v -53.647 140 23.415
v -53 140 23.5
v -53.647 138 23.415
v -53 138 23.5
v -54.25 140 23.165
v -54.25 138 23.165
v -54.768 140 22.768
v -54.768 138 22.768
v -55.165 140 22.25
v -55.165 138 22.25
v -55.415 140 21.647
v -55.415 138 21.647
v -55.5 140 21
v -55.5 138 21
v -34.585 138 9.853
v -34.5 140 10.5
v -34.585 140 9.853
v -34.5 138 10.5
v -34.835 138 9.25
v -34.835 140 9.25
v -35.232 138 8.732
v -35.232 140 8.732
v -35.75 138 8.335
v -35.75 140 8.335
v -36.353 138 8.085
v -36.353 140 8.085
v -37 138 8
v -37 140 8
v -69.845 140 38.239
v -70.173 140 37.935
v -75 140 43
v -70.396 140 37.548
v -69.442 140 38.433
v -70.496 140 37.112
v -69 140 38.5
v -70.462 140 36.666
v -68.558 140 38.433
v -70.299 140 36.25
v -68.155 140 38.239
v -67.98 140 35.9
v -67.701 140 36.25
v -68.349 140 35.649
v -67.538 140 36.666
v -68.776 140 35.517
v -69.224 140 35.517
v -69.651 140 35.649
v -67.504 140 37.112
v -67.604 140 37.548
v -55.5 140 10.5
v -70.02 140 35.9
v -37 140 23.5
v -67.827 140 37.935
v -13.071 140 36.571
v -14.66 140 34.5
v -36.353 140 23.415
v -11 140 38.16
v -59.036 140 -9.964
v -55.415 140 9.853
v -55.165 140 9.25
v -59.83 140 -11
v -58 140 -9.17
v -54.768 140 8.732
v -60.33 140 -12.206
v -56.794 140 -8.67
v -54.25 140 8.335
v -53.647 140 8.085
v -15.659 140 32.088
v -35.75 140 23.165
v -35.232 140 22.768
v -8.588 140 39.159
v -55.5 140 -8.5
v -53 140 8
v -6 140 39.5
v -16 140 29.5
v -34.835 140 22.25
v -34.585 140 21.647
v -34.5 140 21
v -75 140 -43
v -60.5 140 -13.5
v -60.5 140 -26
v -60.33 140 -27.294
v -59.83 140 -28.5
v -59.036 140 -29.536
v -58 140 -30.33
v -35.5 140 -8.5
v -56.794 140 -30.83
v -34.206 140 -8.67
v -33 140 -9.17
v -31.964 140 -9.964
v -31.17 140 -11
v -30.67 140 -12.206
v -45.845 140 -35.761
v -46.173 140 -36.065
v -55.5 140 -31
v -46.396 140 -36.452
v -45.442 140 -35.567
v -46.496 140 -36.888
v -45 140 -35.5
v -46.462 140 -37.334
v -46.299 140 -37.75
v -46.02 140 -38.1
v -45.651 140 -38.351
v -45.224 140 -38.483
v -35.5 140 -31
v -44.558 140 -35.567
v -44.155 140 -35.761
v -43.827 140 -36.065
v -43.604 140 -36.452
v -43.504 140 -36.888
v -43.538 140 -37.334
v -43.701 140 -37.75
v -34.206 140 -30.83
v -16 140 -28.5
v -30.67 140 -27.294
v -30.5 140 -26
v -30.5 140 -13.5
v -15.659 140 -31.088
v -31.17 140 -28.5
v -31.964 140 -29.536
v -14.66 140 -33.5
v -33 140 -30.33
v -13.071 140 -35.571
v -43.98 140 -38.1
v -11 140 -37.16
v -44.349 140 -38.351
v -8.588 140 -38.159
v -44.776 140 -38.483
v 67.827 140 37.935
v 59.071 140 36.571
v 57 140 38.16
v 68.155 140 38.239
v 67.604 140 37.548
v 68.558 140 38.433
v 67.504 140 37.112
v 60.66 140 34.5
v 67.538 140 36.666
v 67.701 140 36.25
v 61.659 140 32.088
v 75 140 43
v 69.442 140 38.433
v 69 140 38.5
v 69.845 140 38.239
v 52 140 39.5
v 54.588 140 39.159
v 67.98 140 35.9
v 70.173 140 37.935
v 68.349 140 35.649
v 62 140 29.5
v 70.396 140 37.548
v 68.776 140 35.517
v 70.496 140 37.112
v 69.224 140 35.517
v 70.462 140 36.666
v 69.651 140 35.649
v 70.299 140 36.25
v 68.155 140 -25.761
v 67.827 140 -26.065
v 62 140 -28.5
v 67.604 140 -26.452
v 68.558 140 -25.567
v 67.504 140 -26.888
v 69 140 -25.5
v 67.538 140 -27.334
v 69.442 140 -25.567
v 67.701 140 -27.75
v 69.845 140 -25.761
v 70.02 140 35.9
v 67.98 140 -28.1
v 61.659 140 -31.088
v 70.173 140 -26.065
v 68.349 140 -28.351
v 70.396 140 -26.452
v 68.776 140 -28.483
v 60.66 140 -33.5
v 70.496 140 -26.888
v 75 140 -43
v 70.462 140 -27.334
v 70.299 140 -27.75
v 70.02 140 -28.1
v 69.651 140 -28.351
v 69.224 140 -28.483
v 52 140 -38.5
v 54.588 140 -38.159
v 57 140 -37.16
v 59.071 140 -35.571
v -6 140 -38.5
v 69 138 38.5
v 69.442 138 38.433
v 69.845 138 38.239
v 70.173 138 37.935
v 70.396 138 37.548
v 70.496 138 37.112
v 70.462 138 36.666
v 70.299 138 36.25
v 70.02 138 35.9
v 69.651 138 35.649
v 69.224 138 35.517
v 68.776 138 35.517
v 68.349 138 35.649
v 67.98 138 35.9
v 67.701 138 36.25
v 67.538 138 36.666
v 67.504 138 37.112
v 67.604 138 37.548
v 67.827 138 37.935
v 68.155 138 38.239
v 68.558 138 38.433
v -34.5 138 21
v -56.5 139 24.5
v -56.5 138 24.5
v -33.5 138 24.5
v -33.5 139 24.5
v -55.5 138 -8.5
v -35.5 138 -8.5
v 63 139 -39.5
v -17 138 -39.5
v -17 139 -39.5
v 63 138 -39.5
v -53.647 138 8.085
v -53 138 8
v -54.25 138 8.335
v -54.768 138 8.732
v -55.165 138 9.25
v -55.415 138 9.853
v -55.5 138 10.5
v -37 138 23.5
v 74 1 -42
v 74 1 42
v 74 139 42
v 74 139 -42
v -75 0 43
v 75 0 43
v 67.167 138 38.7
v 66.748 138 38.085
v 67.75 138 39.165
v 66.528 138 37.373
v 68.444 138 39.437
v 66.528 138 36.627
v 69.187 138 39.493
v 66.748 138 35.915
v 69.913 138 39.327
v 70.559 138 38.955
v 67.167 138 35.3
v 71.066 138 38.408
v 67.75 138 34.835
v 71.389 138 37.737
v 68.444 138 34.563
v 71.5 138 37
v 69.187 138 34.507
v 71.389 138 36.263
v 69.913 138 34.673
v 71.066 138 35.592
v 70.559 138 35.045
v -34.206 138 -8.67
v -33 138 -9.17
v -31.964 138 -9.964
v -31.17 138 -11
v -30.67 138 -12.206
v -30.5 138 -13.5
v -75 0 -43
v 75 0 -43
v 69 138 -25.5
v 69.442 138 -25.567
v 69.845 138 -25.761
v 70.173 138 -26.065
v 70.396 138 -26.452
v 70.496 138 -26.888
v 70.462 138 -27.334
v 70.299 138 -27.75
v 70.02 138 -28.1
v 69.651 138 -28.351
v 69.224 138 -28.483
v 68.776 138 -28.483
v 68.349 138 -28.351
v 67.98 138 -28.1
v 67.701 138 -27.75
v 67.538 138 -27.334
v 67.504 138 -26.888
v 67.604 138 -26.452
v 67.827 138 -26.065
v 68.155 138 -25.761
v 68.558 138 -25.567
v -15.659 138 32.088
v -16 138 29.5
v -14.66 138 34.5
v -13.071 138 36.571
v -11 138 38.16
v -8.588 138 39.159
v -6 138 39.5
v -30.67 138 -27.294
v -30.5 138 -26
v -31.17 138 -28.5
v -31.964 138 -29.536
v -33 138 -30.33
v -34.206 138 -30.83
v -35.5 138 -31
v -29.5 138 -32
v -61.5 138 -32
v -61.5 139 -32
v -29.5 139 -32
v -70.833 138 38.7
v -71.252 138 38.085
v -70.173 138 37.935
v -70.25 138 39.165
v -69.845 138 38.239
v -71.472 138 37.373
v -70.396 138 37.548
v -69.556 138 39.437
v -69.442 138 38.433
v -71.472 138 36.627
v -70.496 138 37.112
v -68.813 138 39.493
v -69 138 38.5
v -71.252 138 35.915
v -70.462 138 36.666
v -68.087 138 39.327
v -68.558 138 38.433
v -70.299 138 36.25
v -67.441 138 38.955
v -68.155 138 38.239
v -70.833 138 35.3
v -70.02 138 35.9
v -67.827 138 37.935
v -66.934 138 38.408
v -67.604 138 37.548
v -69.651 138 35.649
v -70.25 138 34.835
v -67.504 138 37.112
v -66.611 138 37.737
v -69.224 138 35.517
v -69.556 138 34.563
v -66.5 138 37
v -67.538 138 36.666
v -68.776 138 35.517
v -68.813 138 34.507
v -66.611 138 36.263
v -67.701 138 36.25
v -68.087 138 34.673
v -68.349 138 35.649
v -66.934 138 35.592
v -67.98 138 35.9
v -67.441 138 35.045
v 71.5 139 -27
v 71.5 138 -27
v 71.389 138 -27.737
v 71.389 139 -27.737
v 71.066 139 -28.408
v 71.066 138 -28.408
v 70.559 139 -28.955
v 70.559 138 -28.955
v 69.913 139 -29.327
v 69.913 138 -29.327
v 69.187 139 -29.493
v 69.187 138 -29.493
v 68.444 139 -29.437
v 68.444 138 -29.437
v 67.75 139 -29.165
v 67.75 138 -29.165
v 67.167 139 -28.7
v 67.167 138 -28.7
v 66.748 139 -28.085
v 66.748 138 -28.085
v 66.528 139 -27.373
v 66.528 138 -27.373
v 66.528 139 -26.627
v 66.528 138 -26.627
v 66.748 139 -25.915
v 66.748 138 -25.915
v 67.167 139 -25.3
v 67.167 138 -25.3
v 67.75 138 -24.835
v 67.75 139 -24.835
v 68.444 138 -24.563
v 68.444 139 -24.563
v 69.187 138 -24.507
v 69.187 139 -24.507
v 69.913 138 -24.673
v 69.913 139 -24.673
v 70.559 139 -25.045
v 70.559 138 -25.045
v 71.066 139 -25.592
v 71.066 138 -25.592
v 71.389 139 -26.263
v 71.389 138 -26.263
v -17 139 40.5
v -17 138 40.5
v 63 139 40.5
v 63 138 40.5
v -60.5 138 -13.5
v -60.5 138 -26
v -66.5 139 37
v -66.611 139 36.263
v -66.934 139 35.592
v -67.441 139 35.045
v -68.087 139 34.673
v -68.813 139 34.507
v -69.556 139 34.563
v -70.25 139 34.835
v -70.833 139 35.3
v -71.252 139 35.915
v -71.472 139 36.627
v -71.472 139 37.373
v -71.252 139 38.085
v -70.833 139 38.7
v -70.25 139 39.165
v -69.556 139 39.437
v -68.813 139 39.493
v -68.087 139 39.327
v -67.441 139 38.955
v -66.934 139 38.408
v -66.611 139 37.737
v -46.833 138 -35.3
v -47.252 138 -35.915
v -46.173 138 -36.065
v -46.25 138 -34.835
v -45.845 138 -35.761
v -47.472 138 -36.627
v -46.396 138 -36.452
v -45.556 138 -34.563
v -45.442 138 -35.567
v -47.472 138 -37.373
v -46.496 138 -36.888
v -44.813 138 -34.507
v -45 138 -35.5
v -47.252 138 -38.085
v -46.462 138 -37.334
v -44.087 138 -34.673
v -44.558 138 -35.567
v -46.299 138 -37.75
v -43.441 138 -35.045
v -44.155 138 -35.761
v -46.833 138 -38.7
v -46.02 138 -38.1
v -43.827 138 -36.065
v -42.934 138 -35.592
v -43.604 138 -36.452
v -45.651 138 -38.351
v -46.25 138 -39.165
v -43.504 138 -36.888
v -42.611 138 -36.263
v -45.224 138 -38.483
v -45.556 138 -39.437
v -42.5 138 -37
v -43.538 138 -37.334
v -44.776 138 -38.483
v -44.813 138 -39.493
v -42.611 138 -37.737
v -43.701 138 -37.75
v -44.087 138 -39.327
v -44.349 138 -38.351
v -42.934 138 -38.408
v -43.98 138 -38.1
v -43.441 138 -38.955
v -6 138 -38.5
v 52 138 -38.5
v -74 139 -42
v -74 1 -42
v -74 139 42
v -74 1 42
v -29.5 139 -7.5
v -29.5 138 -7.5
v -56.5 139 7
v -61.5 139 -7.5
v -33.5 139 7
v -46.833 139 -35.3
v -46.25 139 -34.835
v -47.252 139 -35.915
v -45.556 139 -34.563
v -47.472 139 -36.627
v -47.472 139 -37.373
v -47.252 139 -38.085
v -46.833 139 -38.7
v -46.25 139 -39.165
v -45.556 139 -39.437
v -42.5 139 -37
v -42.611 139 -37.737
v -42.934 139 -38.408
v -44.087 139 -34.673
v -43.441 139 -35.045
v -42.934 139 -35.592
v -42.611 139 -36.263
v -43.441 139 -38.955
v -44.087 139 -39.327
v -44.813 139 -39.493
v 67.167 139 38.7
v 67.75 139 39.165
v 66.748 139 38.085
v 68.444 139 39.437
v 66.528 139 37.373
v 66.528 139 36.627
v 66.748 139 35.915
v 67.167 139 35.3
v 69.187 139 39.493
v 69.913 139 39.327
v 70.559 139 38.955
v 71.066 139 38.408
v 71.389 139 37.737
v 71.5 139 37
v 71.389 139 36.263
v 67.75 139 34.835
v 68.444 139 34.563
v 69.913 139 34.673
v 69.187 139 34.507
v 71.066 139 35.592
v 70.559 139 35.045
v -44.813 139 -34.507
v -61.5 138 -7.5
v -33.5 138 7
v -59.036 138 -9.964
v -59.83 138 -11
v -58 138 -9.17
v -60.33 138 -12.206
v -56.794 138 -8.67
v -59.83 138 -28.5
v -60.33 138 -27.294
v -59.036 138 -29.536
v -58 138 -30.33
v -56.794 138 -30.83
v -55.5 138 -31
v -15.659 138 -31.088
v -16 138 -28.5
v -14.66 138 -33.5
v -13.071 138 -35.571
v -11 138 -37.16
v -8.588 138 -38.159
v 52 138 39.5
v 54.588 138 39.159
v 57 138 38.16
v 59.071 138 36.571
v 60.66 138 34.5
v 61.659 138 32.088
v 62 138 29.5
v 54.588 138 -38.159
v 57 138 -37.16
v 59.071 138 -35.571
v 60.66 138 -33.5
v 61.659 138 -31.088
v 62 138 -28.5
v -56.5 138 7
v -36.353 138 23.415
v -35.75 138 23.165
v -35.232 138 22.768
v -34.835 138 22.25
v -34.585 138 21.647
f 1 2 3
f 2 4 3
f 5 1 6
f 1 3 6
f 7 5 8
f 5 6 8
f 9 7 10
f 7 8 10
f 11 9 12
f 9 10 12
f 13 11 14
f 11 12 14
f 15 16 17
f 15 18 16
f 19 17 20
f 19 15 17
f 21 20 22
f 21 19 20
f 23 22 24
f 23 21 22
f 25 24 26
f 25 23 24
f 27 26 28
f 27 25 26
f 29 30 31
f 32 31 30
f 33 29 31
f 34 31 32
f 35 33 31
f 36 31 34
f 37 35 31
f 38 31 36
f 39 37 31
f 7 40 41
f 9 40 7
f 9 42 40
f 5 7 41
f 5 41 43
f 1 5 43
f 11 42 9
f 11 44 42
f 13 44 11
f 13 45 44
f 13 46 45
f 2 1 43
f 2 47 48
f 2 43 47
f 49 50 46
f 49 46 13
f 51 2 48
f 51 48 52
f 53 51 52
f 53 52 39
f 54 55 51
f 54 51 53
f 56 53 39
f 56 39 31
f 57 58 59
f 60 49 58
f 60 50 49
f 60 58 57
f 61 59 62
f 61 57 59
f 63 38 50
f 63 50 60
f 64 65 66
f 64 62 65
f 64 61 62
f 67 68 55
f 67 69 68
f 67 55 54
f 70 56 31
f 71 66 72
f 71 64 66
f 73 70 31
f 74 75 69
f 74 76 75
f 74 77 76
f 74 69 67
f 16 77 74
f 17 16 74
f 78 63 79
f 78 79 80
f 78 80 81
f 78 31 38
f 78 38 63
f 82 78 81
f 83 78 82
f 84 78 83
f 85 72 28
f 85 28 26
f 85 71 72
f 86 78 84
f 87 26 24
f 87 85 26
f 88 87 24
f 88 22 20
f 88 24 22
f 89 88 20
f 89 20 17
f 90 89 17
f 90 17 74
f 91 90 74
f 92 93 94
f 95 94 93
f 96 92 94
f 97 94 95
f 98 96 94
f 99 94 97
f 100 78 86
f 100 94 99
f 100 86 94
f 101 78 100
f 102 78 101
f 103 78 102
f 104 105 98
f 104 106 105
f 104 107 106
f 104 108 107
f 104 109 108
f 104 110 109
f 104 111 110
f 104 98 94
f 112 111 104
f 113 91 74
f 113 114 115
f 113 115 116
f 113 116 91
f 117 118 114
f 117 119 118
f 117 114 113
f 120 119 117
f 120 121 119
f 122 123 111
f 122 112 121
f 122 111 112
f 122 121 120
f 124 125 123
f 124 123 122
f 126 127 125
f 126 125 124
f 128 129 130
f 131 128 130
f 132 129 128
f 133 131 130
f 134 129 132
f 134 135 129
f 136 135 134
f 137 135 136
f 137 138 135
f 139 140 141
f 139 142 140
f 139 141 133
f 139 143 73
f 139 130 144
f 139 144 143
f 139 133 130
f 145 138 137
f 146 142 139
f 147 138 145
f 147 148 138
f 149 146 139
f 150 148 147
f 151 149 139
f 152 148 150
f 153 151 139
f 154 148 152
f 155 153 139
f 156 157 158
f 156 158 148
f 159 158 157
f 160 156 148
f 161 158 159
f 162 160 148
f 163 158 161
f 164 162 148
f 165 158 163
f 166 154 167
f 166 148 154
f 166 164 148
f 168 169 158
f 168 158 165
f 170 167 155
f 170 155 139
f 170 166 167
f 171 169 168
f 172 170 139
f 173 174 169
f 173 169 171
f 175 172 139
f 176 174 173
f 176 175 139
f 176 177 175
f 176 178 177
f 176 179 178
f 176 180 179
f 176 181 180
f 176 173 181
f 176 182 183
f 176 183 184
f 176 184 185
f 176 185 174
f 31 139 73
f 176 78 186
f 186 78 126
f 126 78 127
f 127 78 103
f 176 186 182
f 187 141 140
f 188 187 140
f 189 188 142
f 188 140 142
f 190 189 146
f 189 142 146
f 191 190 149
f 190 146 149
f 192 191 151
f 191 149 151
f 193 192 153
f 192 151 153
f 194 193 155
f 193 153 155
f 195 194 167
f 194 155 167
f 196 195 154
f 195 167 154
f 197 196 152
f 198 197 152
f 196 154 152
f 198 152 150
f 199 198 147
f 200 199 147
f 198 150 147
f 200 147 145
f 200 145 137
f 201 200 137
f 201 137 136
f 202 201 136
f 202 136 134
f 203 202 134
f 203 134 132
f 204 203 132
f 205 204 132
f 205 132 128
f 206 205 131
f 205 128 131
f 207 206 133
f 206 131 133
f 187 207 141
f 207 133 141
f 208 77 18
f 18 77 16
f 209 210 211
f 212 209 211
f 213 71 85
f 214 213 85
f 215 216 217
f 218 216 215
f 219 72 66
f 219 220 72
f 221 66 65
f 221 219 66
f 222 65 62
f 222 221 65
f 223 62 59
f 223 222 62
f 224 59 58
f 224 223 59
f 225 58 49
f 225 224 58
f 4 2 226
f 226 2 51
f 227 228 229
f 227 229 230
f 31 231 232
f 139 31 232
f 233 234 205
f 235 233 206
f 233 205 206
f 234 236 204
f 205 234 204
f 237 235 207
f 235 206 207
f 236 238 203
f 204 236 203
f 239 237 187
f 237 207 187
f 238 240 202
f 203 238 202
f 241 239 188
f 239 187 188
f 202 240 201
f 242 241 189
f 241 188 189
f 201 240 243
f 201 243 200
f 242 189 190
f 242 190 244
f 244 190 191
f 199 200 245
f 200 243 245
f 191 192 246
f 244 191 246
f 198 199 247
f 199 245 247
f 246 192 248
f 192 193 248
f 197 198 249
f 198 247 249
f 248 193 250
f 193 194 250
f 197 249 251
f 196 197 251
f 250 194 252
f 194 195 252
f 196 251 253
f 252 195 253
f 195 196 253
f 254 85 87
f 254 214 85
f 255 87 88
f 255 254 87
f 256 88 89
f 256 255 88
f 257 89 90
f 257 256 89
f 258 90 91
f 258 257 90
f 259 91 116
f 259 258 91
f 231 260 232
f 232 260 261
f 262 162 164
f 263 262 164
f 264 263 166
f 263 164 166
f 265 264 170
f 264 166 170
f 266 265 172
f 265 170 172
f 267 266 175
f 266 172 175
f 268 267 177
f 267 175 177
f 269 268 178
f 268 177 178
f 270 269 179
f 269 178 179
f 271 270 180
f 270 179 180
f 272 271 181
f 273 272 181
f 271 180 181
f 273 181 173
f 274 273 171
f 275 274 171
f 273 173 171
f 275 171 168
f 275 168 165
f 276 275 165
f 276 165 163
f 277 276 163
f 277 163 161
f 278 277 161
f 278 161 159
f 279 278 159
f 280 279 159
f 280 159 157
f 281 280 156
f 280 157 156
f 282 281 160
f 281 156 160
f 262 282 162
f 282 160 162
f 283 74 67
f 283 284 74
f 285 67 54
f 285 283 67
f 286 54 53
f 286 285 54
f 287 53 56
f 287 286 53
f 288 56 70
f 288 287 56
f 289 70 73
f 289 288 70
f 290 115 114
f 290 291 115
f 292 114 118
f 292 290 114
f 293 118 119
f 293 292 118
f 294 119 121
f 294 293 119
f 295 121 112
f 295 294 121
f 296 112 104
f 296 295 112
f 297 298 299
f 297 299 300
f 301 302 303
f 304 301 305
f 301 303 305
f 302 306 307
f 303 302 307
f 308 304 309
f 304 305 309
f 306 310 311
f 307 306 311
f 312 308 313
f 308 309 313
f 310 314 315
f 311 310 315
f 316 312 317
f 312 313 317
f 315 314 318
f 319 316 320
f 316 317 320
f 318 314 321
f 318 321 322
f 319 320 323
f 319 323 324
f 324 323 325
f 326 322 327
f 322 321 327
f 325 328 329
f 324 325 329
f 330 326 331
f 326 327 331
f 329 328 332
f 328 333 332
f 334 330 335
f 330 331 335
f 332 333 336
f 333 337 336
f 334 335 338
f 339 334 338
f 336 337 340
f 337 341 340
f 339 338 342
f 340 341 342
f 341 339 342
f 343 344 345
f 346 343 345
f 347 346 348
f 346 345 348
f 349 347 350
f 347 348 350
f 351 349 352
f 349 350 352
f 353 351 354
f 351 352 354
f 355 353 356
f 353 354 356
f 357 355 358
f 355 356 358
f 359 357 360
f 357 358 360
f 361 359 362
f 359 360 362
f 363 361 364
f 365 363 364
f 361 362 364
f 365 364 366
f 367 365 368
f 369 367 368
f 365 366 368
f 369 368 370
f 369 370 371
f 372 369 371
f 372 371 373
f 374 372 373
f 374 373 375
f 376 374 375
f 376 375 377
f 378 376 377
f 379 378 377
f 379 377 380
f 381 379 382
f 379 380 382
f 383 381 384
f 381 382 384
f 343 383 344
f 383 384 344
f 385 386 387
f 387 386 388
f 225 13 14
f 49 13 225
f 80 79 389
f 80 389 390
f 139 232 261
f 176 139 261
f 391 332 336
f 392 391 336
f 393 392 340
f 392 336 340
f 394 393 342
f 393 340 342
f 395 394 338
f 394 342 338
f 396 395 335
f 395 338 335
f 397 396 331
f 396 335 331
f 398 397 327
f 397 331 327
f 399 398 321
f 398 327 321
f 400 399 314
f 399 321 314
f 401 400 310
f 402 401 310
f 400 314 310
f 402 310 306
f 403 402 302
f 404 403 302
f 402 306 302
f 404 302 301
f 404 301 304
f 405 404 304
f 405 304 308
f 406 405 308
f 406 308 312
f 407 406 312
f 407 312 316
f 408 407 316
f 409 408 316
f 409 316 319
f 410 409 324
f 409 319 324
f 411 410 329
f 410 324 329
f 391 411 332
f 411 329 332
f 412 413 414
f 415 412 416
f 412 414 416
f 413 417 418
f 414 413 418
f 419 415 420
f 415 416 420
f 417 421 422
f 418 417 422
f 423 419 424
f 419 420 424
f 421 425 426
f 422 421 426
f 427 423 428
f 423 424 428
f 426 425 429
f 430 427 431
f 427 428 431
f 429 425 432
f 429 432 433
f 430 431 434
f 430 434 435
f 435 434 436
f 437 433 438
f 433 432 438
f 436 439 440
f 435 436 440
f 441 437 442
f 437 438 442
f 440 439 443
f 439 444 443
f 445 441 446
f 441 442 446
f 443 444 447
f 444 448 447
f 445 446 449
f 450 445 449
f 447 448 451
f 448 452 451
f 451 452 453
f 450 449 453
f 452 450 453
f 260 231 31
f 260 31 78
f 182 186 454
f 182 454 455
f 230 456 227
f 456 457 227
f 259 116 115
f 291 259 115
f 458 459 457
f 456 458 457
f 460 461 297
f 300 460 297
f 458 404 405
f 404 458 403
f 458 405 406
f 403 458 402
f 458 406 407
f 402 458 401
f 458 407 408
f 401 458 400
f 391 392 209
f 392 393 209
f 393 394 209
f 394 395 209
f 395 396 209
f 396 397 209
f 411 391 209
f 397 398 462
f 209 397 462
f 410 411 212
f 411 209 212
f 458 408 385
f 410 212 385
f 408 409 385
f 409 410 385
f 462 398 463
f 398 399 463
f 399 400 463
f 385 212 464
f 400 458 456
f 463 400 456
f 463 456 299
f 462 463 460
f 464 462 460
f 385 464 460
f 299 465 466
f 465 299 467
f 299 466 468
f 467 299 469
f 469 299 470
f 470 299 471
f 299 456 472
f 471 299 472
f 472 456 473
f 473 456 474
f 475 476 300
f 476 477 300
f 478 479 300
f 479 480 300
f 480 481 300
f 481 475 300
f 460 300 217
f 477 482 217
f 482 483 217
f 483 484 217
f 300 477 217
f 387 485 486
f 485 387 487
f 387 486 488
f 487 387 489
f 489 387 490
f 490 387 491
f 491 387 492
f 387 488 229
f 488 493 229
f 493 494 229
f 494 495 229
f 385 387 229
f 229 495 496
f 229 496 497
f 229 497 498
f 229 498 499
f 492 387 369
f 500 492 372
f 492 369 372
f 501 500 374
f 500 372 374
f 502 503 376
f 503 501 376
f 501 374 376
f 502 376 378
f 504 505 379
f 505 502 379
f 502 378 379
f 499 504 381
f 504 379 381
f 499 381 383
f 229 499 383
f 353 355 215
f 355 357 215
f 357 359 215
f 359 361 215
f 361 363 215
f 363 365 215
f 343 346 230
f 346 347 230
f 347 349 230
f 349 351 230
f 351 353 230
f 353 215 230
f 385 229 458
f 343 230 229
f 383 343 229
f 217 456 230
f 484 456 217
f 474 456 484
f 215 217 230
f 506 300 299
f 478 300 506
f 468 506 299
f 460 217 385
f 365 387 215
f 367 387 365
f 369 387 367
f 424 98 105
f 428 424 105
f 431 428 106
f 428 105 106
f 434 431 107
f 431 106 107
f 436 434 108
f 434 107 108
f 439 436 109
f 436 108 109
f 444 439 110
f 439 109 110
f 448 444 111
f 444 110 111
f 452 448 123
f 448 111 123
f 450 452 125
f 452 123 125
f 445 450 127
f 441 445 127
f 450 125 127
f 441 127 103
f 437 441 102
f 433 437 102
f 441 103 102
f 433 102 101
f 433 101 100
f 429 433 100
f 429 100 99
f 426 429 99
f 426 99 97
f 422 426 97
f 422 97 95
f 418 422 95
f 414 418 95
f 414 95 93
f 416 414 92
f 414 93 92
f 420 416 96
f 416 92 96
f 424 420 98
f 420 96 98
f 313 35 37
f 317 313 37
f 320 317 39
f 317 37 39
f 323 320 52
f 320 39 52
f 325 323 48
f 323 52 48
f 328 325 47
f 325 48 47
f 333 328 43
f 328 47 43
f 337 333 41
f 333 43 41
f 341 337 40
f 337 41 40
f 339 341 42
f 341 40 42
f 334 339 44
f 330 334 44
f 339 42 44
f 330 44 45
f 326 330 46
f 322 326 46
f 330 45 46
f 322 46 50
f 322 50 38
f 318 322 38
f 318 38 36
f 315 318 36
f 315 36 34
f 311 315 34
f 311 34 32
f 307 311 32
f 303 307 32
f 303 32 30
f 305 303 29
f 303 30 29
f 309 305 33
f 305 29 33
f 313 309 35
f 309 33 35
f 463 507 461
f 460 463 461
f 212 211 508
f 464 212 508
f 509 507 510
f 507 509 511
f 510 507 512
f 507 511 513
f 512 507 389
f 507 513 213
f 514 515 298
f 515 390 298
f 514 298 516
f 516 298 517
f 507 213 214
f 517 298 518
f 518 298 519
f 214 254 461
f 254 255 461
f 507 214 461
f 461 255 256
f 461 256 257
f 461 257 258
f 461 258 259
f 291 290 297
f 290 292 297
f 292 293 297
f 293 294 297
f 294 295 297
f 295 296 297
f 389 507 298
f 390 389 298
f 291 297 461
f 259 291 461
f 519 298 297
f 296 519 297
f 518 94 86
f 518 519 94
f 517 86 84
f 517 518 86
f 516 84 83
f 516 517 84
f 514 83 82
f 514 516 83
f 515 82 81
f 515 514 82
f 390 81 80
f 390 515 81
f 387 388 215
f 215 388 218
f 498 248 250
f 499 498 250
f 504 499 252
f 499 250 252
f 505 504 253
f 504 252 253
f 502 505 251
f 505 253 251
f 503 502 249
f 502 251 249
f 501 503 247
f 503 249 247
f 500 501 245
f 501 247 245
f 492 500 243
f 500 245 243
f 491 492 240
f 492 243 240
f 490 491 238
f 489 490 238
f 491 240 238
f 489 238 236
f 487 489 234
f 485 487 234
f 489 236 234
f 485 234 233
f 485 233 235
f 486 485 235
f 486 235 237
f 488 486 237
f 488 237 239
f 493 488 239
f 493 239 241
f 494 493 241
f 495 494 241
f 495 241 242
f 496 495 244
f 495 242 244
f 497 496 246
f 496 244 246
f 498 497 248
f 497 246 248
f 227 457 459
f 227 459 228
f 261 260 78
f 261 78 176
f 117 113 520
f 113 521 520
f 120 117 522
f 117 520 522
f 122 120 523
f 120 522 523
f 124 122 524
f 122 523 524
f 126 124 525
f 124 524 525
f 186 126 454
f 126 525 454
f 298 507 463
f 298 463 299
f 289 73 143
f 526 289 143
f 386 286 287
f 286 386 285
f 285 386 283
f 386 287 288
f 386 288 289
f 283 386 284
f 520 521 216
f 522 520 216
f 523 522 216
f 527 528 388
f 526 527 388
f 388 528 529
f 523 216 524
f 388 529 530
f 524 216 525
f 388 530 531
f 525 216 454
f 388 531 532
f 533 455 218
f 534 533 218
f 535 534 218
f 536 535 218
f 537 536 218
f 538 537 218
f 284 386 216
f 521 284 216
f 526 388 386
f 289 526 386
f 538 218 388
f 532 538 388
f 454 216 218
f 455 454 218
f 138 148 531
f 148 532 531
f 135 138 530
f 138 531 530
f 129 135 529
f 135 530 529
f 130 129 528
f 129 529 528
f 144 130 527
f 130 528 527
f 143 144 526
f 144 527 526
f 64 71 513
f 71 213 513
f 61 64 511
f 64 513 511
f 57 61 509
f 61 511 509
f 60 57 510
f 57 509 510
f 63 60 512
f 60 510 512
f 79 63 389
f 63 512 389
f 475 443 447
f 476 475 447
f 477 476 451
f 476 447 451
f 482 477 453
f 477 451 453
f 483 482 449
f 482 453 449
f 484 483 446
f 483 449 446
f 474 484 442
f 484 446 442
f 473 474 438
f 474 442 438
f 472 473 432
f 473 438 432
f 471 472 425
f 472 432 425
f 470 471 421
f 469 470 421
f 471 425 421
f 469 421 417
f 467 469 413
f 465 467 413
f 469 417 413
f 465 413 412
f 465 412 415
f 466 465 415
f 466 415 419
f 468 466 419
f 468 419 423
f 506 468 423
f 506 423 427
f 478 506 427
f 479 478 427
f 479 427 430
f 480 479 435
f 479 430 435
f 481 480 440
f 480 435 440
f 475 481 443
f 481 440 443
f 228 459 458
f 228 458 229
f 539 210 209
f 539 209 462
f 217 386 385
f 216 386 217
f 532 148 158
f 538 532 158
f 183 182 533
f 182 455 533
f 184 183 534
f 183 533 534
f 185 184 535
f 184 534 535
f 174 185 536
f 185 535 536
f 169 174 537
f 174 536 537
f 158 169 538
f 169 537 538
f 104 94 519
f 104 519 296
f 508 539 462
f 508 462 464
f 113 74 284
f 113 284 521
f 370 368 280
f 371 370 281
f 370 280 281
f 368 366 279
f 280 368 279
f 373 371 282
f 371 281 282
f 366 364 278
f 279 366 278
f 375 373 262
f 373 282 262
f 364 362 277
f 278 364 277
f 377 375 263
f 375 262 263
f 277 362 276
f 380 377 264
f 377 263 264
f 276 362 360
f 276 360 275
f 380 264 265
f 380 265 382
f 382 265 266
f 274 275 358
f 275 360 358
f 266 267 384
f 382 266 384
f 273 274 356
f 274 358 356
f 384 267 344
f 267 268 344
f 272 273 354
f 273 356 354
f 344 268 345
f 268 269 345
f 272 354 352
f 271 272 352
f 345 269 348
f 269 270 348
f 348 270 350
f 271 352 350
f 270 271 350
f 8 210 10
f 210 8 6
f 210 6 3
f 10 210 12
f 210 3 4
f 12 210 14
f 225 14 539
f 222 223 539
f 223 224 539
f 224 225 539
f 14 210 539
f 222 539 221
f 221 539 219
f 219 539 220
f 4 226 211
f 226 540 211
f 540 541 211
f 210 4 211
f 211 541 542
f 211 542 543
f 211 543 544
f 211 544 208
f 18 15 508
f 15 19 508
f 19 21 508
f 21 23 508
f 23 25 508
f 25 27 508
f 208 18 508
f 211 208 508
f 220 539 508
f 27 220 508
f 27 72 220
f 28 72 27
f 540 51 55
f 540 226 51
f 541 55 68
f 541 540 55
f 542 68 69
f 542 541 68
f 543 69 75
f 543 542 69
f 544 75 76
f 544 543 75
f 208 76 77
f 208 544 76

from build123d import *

# Parameters (mm, degrees)
SKETCH1_W            = 150
SKETCH1_H            = 86
BOSS_EXTRUDE1_DEPTH  = 140
SKETCH2_R            = 1.5
SKETCH2_W            = 78
SKETCH2_H            = 78
SKETCH2_W_2          = 30
SKETCH2_H_2          = 22.5
SKETCH2_W_3          = 21
SKETCH2_H_3          = 15.5
CUT_EXTRUDE1_DEPTH   = 2
SHELL4_START         = 1
SHELL4_OUTLINE_W     = 148
SHELL4_OUTLINE_H     = 84
SHELL4_DEPTH         = 137
SHELL4_START_2       = 138
SHELL4_2_OUTLINE_W   = 148
SHELL4_2_OUTLINE_H   = 84
SHELL4_2_OUTLINE_R   = 2.5
SHELL4_2_OUTLINE_W_2 = 23
SHELL4_2_OUTLINE_H_2 = 17.5
SHELL4_2_OUTLINE_W_3 = 80
SHELL4_2_OUTLINE_H_3 = 80
SHELL4_2_OUTLINE_W_4 = 32
SHELL4_2_OUTLINE_H_4 = 24.5
SHELL4_2_DEPTH       = 1
FILLET1_R            = 10
FILLET2_R            = 5
FILLET3_R            = 2.5


# Read off the part's stored shape, not the designer's step: Shell4
with BuildPart() as part:
    # Sketch1 → Boss-Extrude1 (new body)
    with BuildSketch(Plane(origin=(0, 0, 0), x_dir=(1, 0, 0), z_dir=(0, 1, 0))):
        Rectangle(SKETCH1_W, SKETCH1_H)
    extrude(amount=BOSS_EXTRUDE1_DEPTH)

    # Sketch2 → Cut-Extrude1 (cut)
    with BuildSketch(Plane(origin=(0, 140, 0), x_dir=(1, 0, 0), z_dir=(0, 1, 0))):
        with Locations(Location((69, -37, 0), (0, 0, 270))):
            Circle(SKETCH2_R)
        with Locations(Location((69, 27, 0), (0, 0, 270))):
            Circle(SKETCH2_R)
        with Locations(Location((-69, -37, 0), (0, 0, 270))):
            Circle(SKETCH2_R)
        with Locations(Location((-45, 37, 0), (0, 0, 270))):
            Circle(SKETCH2_R)
        with Locations((23, -0.5)):
            Rectangle(SKETCH2_W, SKETCH2_H)
        with Locations((-45.5, 19.75)):
            Rectangle(SKETCH2_W_2, SKETCH2_H_2)
        with Locations((-45, -15.75)):
            Rectangle(SKETCH2_W_3, SKETCH2_H_3)
    extrude(amount=-CUT_EXTRUDE1_DEPTH, mode=Mode.SUBTRACT)

    # Shell4 outline → Shell4 (cut)
    with BuildSketch(Plane(origin=(0, 0, 0), x_dir=(1, 0, 0), z_dir=(0, 1, 0)).offset(SHELL4_START)):
        Rectangle(SHELL4_OUTLINE_W, SHELL4_OUTLINE_H)
    extrude(amount=SHELL4_DEPTH, mode=Mode.SUBTRACT)

    # Shell4 2 outline → Shell4 2 (cut)
    with BuildSketch(Plane(origin=(0, 0, 0), x_dir=(1, 0, 0), z_dir=(0, 1, 0)).offset(SHELL4_START_2)):
        Rectangle(SHELL4_2_OUTLINE_W, SHELL4_2_OUTLINE_H)
        with Locations((-69, -37)):
            Circle(SHELL4_2_OUTLINE_R, mode=Mode.SUBTRACT)
        with Locations((-45, -15.75)):
            Rectangle(SHELL4_2_OUTLINE_W_2, SHELL4_2_OUTLINE_H_2, mode=Mode.SUBTRACT)
        with Locations((69, -37)):
            Circle(SHELL4_2_OUTLINE_R, mode=Mode.SUBTRACT)
        with Locations((23, -0.5)):
            Rectangle(SHELL4_2_OUTLINE_W_3, SHELL4_2_OUTLINE_H_3, mode=Mode.SUBTRACT)
        with Locations((-45.5, 19.75)):
            Rectangle(SHELL4_2_OUTLINE_W_4, SHELL4_2_OUTLINE_H_4, mode=Mode.SUBTRACT)
        with Locations((-45, 37)):
            Circle(SHELL4_2_OUTLINE_R, mode=Mode.SUBTRACT)
        with Locations((69, 27)):
            Circle(SHELL4_2_OUTLINE_R, mode=Mode.SUBTRACT)
    extrude(amount=SHELL4_2_DEPTH, mode=Mode.SUBTRACT)

    # Fillet1
    fillet1_edges = [part.edges().sort_by_distance(p)[0] for p in [
        (-16, 139, 39.5),
        (-16, 139, -38.5),
        (62, 139, -38.5),
        (62, 139, 39.5),
    ]]
    fillet(fillet1_edges, radius=FILLET1_R)

    # Fillet2
    fillet2_edges = [part.edges().sort_by_distance(p)[0] for p in [
        (-60.5, 139, -8.5),
        (-60.5, 139, -31),
        (-30.5, 139, -31),
        (-30.5, 139, -8.5),
    ]]
    fillet(fillet2_edges, radius=FILLET2_R)

    # Fillet3
    fillet3_edges = [part.edges().sort_by_distance(p)[0] for p in [
        (-55.5, 139, 23.5),
        (-55.5, 139, 8),
        (-34.5, 139, 8),
        (-34.5, 139, 23.5),
    ]]
    fillet(fillet3_edges, radius=FILLET3_R)


solid = part.part
